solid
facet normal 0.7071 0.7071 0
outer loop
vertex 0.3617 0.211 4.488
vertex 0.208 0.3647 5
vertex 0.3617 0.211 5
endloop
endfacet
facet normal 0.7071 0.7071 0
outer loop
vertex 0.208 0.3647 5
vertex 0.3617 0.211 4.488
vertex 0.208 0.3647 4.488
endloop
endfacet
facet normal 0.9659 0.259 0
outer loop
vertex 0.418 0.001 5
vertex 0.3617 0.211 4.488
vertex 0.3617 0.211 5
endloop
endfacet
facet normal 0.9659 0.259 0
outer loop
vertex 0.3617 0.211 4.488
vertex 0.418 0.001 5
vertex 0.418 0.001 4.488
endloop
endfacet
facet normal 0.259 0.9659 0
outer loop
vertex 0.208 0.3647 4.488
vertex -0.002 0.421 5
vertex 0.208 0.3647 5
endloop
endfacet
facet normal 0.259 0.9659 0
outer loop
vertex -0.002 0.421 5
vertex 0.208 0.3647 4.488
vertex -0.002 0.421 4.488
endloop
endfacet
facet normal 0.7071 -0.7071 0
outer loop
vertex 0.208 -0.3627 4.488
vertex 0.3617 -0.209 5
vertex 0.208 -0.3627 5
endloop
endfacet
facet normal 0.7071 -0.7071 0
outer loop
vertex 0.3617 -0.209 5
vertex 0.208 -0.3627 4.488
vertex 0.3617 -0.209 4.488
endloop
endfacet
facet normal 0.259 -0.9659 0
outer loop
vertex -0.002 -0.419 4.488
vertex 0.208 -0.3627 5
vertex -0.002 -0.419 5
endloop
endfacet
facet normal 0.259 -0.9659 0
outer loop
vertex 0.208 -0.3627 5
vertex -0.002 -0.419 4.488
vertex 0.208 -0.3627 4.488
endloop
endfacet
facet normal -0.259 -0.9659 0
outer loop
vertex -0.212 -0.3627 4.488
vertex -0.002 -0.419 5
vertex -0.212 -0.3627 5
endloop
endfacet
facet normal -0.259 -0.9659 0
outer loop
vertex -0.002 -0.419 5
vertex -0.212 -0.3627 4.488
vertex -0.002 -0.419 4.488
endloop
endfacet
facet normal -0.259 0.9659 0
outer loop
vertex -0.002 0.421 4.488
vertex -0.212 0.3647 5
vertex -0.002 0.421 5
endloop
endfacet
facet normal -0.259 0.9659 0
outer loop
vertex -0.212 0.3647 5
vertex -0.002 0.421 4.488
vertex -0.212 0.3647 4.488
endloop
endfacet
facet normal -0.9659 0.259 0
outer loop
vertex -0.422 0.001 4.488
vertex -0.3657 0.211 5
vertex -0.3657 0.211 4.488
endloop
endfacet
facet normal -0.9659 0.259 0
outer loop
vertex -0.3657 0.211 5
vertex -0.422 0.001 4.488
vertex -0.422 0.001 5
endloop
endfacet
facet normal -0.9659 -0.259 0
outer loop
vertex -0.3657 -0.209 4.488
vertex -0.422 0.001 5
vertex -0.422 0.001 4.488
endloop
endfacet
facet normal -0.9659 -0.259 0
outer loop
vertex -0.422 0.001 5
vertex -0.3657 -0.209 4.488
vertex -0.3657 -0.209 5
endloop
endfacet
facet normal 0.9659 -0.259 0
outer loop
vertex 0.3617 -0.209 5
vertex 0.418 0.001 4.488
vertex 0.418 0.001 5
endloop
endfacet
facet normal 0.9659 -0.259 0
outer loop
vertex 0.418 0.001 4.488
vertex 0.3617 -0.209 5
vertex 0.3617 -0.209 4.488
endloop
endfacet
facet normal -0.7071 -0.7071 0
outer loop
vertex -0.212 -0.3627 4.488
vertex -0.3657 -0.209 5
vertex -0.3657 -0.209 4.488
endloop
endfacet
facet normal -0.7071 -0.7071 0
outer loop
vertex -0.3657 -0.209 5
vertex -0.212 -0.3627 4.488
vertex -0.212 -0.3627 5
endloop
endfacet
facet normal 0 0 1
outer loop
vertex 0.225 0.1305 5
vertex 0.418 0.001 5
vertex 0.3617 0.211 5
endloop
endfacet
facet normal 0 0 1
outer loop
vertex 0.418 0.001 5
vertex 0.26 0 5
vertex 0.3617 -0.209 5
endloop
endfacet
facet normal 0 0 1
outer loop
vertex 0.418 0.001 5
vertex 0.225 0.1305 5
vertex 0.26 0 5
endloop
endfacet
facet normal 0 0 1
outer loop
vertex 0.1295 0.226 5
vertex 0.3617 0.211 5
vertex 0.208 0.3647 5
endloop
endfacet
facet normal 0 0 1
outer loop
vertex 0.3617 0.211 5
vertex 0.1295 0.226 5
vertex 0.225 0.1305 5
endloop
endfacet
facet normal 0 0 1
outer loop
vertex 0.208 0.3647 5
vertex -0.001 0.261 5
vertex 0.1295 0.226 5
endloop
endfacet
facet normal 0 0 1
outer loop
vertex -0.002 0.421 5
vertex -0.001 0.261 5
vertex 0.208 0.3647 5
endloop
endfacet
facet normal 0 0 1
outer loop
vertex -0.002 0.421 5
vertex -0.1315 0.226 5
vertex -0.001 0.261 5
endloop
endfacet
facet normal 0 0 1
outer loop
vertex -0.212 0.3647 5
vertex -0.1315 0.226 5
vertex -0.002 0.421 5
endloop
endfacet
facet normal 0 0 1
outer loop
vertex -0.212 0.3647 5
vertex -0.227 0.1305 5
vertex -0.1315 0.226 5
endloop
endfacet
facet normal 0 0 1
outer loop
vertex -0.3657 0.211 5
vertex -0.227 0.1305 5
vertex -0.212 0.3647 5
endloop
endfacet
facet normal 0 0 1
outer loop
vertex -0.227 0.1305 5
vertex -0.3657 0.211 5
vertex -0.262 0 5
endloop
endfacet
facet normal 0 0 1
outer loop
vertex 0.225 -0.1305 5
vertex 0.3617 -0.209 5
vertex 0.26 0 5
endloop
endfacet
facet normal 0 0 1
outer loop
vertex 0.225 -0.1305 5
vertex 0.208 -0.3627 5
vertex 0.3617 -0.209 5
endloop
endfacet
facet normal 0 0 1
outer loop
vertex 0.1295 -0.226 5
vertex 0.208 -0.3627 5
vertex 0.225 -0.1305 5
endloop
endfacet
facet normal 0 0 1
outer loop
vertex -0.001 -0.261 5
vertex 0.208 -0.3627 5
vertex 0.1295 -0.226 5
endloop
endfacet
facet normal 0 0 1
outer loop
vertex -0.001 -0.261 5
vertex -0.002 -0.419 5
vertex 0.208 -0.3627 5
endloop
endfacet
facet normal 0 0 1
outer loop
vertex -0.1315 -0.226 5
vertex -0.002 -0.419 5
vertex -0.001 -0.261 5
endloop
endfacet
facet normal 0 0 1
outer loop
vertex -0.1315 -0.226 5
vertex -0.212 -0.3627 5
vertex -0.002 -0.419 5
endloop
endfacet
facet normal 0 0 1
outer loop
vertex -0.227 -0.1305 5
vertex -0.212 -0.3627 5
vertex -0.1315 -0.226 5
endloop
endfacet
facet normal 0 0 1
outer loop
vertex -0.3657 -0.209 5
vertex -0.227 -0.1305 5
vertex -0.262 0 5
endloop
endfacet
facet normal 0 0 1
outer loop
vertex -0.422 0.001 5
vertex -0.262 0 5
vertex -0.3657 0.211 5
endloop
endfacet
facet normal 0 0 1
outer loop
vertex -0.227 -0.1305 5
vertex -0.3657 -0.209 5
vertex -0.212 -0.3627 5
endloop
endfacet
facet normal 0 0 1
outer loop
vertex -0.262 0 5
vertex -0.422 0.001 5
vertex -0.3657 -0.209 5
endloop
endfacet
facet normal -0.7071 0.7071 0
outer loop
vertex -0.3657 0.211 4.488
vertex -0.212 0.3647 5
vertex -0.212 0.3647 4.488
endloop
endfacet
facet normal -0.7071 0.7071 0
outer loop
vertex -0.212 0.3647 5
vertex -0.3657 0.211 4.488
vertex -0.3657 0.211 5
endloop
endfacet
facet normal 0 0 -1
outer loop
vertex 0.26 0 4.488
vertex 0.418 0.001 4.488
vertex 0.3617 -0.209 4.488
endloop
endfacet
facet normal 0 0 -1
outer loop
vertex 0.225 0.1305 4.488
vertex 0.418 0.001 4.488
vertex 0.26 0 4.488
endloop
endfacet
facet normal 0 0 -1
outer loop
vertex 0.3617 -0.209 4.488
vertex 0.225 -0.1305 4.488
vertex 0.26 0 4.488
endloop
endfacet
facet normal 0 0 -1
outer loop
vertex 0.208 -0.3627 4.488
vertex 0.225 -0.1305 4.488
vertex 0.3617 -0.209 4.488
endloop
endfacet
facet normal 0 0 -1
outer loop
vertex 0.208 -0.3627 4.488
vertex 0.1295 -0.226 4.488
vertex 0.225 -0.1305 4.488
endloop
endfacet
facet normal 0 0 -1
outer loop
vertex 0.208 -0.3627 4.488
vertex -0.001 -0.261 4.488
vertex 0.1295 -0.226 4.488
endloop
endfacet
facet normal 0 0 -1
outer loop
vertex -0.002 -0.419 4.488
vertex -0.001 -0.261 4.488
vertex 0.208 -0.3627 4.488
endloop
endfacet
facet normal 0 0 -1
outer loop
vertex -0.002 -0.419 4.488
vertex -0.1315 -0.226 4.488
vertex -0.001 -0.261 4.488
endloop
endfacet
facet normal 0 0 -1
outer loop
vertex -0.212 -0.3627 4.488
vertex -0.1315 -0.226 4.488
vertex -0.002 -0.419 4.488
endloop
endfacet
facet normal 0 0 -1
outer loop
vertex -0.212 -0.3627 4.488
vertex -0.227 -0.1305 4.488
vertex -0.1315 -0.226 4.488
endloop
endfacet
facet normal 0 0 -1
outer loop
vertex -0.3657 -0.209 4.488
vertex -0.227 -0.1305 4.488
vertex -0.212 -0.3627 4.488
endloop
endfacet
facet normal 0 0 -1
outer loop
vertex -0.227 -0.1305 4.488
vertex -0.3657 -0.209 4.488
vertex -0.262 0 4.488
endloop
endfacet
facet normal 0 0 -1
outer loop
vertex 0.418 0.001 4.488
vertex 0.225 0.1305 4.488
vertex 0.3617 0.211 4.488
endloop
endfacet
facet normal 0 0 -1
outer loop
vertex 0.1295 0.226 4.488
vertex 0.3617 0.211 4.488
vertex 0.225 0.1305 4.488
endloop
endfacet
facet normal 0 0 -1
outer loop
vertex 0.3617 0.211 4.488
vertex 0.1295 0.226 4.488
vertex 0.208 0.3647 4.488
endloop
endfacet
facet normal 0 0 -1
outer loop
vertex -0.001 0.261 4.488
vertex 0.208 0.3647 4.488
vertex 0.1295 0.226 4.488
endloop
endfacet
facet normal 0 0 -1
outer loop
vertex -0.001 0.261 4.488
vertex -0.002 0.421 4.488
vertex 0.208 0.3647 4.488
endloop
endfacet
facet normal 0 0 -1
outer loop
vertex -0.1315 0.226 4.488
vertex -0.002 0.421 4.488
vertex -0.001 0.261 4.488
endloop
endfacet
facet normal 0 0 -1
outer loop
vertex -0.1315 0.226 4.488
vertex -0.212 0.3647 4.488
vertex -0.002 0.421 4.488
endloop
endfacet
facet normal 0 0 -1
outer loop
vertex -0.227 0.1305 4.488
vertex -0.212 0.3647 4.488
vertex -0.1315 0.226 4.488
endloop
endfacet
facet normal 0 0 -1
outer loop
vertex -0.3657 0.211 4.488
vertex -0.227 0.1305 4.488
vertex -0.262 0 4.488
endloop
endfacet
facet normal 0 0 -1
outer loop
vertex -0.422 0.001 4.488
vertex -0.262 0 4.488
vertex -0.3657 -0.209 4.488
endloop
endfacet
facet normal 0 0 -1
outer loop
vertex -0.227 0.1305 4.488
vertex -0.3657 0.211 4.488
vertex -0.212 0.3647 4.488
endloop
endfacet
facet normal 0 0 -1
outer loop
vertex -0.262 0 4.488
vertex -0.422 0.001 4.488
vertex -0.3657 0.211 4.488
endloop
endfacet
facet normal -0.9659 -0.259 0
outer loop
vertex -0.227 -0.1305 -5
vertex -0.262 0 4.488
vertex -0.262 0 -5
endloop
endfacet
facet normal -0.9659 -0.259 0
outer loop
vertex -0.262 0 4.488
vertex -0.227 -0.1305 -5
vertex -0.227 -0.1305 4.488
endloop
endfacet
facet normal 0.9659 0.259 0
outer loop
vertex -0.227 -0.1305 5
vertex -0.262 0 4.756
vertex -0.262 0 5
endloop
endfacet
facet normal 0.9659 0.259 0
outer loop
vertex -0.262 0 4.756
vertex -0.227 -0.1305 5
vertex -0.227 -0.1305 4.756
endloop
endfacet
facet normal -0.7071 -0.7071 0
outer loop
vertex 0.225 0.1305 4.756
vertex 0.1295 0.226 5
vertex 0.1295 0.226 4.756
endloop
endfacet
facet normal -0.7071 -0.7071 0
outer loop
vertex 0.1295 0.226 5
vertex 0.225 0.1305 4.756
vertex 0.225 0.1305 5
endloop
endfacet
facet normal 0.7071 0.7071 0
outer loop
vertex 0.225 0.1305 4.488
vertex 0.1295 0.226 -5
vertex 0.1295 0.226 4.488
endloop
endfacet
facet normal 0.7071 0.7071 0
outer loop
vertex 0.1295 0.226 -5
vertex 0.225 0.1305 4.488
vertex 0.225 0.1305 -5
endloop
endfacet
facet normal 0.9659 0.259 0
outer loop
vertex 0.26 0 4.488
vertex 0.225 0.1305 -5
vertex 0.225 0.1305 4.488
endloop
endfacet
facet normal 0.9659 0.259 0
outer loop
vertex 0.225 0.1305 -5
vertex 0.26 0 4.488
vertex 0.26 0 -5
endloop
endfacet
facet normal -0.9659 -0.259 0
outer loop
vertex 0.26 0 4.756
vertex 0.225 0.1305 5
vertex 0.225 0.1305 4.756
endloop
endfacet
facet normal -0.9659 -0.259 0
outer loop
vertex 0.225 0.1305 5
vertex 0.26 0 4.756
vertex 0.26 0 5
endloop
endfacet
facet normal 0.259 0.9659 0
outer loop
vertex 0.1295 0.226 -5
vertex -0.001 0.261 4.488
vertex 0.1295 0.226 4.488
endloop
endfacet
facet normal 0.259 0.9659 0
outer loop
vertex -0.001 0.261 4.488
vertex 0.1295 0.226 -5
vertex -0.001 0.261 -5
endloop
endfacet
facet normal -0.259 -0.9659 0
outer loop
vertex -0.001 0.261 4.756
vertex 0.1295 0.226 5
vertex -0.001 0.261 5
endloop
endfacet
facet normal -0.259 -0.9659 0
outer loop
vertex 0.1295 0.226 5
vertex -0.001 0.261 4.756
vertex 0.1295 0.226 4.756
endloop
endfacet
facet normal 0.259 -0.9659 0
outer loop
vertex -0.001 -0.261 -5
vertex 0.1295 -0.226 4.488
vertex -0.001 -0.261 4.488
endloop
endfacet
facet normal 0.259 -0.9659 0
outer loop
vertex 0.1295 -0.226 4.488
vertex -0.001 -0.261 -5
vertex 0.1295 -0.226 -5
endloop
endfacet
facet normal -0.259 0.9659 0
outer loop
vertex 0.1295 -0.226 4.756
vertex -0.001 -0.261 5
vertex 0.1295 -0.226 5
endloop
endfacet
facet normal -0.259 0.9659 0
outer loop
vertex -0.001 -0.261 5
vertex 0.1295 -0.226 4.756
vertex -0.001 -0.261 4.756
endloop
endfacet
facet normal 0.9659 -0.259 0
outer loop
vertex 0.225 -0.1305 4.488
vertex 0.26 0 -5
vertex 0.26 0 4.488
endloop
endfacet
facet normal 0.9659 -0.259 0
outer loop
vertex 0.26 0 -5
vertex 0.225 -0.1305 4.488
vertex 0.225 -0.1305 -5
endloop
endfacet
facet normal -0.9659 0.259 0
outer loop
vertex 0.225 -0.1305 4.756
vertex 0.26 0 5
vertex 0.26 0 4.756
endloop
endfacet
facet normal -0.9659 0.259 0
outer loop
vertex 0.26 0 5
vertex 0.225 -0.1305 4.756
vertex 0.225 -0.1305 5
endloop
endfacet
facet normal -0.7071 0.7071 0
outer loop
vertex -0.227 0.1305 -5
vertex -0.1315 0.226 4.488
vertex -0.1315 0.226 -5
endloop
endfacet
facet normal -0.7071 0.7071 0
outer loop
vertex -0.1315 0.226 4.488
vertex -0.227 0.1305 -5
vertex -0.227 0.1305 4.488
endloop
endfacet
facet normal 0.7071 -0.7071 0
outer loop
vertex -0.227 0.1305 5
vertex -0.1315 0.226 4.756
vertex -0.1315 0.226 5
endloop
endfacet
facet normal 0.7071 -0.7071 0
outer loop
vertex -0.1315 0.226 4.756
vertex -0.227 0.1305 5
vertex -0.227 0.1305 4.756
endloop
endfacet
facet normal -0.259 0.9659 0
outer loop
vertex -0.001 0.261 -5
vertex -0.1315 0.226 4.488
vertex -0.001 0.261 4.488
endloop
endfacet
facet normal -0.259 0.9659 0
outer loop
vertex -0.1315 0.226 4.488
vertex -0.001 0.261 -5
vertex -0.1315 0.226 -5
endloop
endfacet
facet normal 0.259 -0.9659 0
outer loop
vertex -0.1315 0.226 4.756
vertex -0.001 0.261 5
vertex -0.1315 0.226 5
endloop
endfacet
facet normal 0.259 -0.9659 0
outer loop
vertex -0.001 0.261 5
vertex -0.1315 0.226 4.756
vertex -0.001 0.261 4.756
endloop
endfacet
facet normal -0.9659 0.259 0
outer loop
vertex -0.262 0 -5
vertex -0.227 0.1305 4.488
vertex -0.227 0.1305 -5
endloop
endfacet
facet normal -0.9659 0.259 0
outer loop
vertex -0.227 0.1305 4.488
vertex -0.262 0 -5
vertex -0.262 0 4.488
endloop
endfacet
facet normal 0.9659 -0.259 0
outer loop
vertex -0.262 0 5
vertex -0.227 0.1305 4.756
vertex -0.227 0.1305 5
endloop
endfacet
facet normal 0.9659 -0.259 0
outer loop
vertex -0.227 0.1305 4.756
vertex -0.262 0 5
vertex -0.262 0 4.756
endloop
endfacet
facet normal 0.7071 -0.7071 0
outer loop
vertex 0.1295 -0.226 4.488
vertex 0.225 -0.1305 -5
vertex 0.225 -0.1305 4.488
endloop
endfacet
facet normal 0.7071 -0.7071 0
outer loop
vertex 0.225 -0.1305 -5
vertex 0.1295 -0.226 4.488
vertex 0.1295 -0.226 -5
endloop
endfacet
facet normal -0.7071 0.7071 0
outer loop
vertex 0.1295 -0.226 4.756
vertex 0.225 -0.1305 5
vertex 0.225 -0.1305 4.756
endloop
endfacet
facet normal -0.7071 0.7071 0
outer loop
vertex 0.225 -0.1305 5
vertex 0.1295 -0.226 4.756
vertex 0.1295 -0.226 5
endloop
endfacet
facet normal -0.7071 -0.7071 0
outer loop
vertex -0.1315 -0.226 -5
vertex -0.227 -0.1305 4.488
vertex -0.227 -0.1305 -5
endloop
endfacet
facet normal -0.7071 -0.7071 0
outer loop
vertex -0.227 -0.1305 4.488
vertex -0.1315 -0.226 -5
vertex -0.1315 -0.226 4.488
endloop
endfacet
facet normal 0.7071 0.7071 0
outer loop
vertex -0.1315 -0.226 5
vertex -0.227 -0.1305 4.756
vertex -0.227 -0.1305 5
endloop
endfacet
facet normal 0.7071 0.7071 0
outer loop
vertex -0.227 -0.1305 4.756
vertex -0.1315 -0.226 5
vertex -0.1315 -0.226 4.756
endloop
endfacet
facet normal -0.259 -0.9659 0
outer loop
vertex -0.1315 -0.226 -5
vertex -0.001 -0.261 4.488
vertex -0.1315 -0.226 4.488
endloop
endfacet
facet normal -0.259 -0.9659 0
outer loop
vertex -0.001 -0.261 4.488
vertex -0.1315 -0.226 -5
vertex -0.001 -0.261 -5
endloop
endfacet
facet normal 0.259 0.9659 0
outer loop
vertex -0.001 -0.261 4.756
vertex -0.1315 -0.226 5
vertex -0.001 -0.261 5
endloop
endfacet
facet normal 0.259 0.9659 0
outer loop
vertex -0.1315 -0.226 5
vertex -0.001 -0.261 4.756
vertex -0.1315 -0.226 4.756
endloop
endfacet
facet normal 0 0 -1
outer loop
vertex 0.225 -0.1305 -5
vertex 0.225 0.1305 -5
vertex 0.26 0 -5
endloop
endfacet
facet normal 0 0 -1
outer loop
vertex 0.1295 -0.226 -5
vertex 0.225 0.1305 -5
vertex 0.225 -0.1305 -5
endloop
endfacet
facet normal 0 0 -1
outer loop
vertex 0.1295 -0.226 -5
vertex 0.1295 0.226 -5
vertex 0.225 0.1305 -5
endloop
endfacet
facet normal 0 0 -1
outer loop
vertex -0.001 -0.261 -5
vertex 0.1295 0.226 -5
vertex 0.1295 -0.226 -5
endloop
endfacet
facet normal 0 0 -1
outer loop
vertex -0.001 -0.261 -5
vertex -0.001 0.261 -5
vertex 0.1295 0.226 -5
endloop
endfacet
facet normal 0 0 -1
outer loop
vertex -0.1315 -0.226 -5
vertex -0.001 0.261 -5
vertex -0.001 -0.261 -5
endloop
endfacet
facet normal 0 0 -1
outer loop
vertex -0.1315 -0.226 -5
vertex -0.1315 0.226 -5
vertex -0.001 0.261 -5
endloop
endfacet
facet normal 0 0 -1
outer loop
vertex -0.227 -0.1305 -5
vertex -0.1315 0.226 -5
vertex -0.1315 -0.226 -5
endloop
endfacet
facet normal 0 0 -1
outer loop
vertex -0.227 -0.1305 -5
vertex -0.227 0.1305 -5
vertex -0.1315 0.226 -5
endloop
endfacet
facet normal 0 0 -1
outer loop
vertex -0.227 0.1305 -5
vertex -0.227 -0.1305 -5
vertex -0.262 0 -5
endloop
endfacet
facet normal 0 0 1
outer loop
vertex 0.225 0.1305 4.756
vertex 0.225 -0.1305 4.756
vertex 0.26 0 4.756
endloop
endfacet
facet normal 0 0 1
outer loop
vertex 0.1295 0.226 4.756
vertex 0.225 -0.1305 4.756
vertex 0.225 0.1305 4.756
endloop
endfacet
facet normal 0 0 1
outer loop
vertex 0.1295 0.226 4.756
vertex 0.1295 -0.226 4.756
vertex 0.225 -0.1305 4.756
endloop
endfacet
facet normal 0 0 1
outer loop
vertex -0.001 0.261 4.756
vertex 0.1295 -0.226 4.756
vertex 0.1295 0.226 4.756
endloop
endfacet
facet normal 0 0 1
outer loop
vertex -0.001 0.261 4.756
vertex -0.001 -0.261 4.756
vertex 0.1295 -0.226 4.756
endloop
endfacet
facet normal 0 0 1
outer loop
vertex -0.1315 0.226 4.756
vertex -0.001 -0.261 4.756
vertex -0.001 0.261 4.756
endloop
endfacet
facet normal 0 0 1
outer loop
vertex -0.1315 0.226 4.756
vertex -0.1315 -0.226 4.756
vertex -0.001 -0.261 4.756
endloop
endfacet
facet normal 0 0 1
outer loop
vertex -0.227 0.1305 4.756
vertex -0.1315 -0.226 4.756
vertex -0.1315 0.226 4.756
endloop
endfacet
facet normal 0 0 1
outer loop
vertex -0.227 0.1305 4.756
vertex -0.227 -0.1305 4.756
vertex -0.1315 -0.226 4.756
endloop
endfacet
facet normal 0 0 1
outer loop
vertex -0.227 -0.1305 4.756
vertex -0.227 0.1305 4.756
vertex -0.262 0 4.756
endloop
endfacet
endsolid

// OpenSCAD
intersection() {
translate([-0.504, -0.504, -6]) cube(size = [1.008, 1.009, 12], center = false);
union() {
difference() {
translate([-0.002, 0.001, 4.488])
cylinder(h = 0.512, r1 = 0.42, r2 = 0.42, center = false, $fn = 12);
translate([-0.001, 0, -18.1])
cylinder(h = 36.2, r1 = 0.261, r2 = 0.261, center = false, $fn = 12);
}
translate([-0.001, 0, -5])
cylinder(h = 9.756, r1 = 0.261, r2 = 0.261, center = false, $fn = 12);
}
}
